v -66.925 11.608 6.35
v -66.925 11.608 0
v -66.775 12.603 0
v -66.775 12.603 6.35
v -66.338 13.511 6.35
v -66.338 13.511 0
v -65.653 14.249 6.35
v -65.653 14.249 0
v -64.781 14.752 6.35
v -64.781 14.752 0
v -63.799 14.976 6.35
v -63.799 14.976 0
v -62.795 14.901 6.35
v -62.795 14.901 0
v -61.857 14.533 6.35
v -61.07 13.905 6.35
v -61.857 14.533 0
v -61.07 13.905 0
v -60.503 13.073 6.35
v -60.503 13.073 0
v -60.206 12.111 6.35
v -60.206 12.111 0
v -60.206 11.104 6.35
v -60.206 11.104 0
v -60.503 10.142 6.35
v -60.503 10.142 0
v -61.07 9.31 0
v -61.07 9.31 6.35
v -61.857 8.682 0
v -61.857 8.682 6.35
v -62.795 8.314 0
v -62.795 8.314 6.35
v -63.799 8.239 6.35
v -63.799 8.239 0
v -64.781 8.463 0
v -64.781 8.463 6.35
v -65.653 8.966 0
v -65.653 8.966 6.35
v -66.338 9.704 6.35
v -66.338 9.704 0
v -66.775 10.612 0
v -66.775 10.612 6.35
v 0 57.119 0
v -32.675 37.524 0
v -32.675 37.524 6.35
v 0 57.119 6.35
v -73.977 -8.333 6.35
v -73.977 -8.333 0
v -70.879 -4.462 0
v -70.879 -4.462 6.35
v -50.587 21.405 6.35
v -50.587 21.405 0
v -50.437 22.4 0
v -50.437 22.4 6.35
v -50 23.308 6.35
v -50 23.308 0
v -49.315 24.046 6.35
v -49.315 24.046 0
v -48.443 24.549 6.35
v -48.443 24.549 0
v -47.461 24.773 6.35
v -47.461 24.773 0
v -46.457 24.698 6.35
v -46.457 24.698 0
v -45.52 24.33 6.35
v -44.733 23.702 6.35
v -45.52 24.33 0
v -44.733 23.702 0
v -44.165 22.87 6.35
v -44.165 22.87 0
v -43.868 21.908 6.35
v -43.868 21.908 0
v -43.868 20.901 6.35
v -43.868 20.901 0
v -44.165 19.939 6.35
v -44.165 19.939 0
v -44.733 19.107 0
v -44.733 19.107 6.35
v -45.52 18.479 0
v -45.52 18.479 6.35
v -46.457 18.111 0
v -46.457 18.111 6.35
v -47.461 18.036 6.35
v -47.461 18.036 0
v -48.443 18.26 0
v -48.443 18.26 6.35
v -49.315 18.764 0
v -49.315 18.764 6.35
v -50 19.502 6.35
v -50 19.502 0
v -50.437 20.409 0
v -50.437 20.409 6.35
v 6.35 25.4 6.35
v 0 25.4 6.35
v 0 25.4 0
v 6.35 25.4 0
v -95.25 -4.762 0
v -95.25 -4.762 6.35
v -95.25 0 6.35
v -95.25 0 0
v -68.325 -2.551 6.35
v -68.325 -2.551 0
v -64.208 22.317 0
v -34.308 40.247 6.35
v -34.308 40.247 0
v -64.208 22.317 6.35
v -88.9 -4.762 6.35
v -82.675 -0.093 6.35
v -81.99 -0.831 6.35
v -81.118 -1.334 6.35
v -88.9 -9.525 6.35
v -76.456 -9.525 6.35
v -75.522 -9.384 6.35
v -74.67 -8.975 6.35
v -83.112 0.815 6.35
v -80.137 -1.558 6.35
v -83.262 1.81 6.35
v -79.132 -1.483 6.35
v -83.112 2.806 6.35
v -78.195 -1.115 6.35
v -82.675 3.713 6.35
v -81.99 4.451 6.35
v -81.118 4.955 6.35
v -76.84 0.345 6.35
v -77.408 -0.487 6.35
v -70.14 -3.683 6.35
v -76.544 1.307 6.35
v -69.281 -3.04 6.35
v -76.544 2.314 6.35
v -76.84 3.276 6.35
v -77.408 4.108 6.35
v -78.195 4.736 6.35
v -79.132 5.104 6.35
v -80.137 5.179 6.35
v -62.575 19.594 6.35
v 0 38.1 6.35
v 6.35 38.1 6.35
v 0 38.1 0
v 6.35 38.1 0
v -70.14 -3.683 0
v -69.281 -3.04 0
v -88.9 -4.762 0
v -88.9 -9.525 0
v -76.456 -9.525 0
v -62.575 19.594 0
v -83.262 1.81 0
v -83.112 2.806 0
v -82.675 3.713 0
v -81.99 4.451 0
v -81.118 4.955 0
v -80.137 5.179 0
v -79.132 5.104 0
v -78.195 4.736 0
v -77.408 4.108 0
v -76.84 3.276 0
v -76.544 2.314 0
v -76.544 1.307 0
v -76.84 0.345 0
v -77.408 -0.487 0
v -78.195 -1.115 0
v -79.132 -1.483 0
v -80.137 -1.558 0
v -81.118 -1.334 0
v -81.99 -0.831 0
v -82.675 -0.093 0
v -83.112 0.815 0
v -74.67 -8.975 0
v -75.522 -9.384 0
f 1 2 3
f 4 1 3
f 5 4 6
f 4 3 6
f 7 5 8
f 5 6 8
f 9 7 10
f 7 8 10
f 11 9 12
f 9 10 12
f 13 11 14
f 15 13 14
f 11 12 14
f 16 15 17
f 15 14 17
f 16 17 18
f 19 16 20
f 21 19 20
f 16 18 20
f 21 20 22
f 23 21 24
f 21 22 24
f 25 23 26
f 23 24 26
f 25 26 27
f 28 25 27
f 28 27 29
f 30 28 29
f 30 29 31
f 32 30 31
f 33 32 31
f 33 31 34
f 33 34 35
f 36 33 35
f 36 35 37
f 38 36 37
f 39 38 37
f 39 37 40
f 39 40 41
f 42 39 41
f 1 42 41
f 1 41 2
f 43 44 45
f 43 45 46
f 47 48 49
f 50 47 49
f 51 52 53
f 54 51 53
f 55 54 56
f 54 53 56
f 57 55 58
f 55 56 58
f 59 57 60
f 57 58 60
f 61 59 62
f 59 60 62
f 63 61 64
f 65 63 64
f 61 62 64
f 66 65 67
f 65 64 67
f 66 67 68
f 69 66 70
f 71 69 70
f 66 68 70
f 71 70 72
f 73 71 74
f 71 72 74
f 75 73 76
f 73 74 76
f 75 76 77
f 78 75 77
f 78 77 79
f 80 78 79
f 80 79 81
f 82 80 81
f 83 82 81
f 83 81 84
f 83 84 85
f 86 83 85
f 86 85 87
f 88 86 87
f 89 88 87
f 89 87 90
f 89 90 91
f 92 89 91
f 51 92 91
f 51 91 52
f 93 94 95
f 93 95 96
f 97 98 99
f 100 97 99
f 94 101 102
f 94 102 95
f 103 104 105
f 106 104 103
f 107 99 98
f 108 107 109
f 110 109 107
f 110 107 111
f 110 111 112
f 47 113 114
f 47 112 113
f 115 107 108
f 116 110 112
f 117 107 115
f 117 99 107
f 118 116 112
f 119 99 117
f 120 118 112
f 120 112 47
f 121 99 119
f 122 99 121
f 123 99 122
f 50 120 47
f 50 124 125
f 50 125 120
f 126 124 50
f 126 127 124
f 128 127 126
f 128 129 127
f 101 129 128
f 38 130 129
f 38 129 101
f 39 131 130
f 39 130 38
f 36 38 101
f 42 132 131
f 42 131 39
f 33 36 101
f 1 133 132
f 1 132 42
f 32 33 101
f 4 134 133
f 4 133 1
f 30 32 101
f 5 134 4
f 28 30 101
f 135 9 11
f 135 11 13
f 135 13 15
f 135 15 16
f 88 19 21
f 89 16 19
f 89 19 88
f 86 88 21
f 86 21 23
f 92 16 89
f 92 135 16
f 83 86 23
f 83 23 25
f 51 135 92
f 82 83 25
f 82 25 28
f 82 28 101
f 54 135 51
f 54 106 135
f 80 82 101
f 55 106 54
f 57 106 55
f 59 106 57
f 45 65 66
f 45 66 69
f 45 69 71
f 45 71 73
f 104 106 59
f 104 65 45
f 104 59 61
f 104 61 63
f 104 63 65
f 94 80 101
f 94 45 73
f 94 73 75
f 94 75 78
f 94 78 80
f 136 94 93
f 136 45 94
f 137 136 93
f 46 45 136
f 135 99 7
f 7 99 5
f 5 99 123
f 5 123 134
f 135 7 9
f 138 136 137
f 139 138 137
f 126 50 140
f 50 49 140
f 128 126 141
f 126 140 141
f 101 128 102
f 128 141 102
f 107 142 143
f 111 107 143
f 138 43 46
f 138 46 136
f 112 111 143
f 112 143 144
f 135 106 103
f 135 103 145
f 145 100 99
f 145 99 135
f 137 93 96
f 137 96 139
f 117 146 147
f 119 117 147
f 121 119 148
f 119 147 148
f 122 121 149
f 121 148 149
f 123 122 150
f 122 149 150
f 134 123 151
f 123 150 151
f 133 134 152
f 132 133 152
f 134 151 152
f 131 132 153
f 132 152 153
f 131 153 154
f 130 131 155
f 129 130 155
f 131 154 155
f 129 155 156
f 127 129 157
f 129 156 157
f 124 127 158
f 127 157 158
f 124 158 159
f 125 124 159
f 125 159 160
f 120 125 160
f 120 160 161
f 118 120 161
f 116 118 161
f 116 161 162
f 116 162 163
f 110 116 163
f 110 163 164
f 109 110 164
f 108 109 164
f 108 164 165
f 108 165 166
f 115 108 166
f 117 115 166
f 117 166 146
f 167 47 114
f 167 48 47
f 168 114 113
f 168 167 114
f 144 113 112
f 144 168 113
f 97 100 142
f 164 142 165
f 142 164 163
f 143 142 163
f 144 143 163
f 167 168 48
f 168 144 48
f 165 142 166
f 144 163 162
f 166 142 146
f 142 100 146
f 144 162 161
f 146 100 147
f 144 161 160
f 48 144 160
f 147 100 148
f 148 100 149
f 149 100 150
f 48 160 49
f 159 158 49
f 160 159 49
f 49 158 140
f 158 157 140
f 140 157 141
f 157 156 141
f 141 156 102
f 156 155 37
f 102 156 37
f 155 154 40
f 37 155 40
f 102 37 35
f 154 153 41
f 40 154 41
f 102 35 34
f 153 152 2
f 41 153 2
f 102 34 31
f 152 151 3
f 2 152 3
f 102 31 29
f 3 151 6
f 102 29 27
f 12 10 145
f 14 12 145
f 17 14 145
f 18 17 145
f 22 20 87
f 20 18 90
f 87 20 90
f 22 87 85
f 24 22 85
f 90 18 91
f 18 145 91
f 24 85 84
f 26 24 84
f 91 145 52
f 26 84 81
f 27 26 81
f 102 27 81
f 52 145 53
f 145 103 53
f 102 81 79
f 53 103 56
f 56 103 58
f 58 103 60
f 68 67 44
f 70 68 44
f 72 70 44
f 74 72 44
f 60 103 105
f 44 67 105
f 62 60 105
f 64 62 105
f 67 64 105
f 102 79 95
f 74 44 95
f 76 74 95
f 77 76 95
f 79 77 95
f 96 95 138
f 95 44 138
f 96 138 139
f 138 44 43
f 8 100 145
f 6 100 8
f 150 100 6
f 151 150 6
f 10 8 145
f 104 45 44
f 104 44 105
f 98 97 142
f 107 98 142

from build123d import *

# Parameters (mm, degrees)
BOSS_EXTRUDE1_DEPTH     = 6.35
CUT_EXTRUDE2_DEPTH      = 7.35
FILLET2_R               = 6.35
SKETCH4_W               = 6.35
SKETCH4_H               = 12.7
SKETCH4_H_2             = 4.7625
BOSS_EXTRUDE2_DEPTH     = 6.35
SKETCH5_W               = 13.97
SKETCH5_H               = 9.525
CUT_EXTRUDE3_DEPTH      = 7.35
FILLET3_R               = 3.175
F_1_4_CLEARANCE_HOLE1_D = 6.7564
BOSS_EXTRUDE3_DEPTH     = 6.35


with BuildPart() as part:
    # Sketch1 → Boss-Extrude1 (new body)
    with BuildSketch(Plane.XY):
        Polygon((-82.55, -19.05), (0, 0), (-88.9, 0), (-88.9, -19.05), align=None)
        Polygon((-95.25, 0), (0, 57.118902343), (0, 0), align=None)
    extrude(amount=BOSS_EXTRUDE1_DEPTH)

    # Sketch3 → Cut-Extrude2 (cut, through all)
    with BuildSketch(Plane.XY.offset(6.35)):
        Polygon((-82.55, -19.05), (-69.85, -3.175), (0, 25.4), (0, 0), align=None)
    extrude(amount=-CUT_EXTRUDE2_DEPTH, mode=Mode.SUBTRACT)

    # Fillet2
    fillet2_edges = [part.edges().sort_by_distance(p)[0] for p in [
        (-69.85, -3.175, 3.175),
    ]]
    fillet(fillet2_edges, radius=FILLET2_R)

    # Sketch4 → Boss-Extrude2 (add)
    with BuildSketch(Plane.XY.offset(6.35)):
        with Locations((3.175, 31.75)):
            Rectangle(SKETCH4_W, SKETCH4_H)
        with Locations((-92.075, -2.38125)):
            Rectangle(SKETCH4_W, SKETCH4_H_2)
    extrude(amount=-BOSS_EXTRUDE2_DEPTH)

    # Sketch5 → Cut-Extrude3 (cut, through all)
    with BuildSketch(Plane.XY.offset(6.35)):
        with Locations((-81.915, -14.2875)):
            Rectangle(SKETCH5_W, SKETCH5_H)
    extrude(amount=-CUT_EXTRUDE3_DEPTH, mode=Mode.SUBTRACT)

    # Fillet3
    fillet3_edges = [part.edges().sort_by_distance(p)[0] for p in [
        (-74.93, -9.525, 3.175),
    ]]
    fillet(fillet3_edges, radius=FILLET3_R)

    # 1/4 Clearance Hole1 (through all)
    with Locations(Plane.XY.offset(6.35)):
        with Locations((-79.884098694, 1.810281574), (-63.546505707, 11.607503394), (-47.20891272, 21.404725214)):
            Hole(F_1_4_CLEARANCE_HOLE1_D / 2)

    # Sketch8 → Boss-Extrude3 (add)
    with BuildSketch(Plane.XY.offset(6.35)):
        Polygon((-32.675185974, 37.524458703), (-34.308056278, 40.247390867), (-64.207684329, 22.317375804), (-62.574814026, 19.59444364), align=None)
    extrude(amount=-BOSS_EXTRUDE3_DEPTH)


solid = part.part
